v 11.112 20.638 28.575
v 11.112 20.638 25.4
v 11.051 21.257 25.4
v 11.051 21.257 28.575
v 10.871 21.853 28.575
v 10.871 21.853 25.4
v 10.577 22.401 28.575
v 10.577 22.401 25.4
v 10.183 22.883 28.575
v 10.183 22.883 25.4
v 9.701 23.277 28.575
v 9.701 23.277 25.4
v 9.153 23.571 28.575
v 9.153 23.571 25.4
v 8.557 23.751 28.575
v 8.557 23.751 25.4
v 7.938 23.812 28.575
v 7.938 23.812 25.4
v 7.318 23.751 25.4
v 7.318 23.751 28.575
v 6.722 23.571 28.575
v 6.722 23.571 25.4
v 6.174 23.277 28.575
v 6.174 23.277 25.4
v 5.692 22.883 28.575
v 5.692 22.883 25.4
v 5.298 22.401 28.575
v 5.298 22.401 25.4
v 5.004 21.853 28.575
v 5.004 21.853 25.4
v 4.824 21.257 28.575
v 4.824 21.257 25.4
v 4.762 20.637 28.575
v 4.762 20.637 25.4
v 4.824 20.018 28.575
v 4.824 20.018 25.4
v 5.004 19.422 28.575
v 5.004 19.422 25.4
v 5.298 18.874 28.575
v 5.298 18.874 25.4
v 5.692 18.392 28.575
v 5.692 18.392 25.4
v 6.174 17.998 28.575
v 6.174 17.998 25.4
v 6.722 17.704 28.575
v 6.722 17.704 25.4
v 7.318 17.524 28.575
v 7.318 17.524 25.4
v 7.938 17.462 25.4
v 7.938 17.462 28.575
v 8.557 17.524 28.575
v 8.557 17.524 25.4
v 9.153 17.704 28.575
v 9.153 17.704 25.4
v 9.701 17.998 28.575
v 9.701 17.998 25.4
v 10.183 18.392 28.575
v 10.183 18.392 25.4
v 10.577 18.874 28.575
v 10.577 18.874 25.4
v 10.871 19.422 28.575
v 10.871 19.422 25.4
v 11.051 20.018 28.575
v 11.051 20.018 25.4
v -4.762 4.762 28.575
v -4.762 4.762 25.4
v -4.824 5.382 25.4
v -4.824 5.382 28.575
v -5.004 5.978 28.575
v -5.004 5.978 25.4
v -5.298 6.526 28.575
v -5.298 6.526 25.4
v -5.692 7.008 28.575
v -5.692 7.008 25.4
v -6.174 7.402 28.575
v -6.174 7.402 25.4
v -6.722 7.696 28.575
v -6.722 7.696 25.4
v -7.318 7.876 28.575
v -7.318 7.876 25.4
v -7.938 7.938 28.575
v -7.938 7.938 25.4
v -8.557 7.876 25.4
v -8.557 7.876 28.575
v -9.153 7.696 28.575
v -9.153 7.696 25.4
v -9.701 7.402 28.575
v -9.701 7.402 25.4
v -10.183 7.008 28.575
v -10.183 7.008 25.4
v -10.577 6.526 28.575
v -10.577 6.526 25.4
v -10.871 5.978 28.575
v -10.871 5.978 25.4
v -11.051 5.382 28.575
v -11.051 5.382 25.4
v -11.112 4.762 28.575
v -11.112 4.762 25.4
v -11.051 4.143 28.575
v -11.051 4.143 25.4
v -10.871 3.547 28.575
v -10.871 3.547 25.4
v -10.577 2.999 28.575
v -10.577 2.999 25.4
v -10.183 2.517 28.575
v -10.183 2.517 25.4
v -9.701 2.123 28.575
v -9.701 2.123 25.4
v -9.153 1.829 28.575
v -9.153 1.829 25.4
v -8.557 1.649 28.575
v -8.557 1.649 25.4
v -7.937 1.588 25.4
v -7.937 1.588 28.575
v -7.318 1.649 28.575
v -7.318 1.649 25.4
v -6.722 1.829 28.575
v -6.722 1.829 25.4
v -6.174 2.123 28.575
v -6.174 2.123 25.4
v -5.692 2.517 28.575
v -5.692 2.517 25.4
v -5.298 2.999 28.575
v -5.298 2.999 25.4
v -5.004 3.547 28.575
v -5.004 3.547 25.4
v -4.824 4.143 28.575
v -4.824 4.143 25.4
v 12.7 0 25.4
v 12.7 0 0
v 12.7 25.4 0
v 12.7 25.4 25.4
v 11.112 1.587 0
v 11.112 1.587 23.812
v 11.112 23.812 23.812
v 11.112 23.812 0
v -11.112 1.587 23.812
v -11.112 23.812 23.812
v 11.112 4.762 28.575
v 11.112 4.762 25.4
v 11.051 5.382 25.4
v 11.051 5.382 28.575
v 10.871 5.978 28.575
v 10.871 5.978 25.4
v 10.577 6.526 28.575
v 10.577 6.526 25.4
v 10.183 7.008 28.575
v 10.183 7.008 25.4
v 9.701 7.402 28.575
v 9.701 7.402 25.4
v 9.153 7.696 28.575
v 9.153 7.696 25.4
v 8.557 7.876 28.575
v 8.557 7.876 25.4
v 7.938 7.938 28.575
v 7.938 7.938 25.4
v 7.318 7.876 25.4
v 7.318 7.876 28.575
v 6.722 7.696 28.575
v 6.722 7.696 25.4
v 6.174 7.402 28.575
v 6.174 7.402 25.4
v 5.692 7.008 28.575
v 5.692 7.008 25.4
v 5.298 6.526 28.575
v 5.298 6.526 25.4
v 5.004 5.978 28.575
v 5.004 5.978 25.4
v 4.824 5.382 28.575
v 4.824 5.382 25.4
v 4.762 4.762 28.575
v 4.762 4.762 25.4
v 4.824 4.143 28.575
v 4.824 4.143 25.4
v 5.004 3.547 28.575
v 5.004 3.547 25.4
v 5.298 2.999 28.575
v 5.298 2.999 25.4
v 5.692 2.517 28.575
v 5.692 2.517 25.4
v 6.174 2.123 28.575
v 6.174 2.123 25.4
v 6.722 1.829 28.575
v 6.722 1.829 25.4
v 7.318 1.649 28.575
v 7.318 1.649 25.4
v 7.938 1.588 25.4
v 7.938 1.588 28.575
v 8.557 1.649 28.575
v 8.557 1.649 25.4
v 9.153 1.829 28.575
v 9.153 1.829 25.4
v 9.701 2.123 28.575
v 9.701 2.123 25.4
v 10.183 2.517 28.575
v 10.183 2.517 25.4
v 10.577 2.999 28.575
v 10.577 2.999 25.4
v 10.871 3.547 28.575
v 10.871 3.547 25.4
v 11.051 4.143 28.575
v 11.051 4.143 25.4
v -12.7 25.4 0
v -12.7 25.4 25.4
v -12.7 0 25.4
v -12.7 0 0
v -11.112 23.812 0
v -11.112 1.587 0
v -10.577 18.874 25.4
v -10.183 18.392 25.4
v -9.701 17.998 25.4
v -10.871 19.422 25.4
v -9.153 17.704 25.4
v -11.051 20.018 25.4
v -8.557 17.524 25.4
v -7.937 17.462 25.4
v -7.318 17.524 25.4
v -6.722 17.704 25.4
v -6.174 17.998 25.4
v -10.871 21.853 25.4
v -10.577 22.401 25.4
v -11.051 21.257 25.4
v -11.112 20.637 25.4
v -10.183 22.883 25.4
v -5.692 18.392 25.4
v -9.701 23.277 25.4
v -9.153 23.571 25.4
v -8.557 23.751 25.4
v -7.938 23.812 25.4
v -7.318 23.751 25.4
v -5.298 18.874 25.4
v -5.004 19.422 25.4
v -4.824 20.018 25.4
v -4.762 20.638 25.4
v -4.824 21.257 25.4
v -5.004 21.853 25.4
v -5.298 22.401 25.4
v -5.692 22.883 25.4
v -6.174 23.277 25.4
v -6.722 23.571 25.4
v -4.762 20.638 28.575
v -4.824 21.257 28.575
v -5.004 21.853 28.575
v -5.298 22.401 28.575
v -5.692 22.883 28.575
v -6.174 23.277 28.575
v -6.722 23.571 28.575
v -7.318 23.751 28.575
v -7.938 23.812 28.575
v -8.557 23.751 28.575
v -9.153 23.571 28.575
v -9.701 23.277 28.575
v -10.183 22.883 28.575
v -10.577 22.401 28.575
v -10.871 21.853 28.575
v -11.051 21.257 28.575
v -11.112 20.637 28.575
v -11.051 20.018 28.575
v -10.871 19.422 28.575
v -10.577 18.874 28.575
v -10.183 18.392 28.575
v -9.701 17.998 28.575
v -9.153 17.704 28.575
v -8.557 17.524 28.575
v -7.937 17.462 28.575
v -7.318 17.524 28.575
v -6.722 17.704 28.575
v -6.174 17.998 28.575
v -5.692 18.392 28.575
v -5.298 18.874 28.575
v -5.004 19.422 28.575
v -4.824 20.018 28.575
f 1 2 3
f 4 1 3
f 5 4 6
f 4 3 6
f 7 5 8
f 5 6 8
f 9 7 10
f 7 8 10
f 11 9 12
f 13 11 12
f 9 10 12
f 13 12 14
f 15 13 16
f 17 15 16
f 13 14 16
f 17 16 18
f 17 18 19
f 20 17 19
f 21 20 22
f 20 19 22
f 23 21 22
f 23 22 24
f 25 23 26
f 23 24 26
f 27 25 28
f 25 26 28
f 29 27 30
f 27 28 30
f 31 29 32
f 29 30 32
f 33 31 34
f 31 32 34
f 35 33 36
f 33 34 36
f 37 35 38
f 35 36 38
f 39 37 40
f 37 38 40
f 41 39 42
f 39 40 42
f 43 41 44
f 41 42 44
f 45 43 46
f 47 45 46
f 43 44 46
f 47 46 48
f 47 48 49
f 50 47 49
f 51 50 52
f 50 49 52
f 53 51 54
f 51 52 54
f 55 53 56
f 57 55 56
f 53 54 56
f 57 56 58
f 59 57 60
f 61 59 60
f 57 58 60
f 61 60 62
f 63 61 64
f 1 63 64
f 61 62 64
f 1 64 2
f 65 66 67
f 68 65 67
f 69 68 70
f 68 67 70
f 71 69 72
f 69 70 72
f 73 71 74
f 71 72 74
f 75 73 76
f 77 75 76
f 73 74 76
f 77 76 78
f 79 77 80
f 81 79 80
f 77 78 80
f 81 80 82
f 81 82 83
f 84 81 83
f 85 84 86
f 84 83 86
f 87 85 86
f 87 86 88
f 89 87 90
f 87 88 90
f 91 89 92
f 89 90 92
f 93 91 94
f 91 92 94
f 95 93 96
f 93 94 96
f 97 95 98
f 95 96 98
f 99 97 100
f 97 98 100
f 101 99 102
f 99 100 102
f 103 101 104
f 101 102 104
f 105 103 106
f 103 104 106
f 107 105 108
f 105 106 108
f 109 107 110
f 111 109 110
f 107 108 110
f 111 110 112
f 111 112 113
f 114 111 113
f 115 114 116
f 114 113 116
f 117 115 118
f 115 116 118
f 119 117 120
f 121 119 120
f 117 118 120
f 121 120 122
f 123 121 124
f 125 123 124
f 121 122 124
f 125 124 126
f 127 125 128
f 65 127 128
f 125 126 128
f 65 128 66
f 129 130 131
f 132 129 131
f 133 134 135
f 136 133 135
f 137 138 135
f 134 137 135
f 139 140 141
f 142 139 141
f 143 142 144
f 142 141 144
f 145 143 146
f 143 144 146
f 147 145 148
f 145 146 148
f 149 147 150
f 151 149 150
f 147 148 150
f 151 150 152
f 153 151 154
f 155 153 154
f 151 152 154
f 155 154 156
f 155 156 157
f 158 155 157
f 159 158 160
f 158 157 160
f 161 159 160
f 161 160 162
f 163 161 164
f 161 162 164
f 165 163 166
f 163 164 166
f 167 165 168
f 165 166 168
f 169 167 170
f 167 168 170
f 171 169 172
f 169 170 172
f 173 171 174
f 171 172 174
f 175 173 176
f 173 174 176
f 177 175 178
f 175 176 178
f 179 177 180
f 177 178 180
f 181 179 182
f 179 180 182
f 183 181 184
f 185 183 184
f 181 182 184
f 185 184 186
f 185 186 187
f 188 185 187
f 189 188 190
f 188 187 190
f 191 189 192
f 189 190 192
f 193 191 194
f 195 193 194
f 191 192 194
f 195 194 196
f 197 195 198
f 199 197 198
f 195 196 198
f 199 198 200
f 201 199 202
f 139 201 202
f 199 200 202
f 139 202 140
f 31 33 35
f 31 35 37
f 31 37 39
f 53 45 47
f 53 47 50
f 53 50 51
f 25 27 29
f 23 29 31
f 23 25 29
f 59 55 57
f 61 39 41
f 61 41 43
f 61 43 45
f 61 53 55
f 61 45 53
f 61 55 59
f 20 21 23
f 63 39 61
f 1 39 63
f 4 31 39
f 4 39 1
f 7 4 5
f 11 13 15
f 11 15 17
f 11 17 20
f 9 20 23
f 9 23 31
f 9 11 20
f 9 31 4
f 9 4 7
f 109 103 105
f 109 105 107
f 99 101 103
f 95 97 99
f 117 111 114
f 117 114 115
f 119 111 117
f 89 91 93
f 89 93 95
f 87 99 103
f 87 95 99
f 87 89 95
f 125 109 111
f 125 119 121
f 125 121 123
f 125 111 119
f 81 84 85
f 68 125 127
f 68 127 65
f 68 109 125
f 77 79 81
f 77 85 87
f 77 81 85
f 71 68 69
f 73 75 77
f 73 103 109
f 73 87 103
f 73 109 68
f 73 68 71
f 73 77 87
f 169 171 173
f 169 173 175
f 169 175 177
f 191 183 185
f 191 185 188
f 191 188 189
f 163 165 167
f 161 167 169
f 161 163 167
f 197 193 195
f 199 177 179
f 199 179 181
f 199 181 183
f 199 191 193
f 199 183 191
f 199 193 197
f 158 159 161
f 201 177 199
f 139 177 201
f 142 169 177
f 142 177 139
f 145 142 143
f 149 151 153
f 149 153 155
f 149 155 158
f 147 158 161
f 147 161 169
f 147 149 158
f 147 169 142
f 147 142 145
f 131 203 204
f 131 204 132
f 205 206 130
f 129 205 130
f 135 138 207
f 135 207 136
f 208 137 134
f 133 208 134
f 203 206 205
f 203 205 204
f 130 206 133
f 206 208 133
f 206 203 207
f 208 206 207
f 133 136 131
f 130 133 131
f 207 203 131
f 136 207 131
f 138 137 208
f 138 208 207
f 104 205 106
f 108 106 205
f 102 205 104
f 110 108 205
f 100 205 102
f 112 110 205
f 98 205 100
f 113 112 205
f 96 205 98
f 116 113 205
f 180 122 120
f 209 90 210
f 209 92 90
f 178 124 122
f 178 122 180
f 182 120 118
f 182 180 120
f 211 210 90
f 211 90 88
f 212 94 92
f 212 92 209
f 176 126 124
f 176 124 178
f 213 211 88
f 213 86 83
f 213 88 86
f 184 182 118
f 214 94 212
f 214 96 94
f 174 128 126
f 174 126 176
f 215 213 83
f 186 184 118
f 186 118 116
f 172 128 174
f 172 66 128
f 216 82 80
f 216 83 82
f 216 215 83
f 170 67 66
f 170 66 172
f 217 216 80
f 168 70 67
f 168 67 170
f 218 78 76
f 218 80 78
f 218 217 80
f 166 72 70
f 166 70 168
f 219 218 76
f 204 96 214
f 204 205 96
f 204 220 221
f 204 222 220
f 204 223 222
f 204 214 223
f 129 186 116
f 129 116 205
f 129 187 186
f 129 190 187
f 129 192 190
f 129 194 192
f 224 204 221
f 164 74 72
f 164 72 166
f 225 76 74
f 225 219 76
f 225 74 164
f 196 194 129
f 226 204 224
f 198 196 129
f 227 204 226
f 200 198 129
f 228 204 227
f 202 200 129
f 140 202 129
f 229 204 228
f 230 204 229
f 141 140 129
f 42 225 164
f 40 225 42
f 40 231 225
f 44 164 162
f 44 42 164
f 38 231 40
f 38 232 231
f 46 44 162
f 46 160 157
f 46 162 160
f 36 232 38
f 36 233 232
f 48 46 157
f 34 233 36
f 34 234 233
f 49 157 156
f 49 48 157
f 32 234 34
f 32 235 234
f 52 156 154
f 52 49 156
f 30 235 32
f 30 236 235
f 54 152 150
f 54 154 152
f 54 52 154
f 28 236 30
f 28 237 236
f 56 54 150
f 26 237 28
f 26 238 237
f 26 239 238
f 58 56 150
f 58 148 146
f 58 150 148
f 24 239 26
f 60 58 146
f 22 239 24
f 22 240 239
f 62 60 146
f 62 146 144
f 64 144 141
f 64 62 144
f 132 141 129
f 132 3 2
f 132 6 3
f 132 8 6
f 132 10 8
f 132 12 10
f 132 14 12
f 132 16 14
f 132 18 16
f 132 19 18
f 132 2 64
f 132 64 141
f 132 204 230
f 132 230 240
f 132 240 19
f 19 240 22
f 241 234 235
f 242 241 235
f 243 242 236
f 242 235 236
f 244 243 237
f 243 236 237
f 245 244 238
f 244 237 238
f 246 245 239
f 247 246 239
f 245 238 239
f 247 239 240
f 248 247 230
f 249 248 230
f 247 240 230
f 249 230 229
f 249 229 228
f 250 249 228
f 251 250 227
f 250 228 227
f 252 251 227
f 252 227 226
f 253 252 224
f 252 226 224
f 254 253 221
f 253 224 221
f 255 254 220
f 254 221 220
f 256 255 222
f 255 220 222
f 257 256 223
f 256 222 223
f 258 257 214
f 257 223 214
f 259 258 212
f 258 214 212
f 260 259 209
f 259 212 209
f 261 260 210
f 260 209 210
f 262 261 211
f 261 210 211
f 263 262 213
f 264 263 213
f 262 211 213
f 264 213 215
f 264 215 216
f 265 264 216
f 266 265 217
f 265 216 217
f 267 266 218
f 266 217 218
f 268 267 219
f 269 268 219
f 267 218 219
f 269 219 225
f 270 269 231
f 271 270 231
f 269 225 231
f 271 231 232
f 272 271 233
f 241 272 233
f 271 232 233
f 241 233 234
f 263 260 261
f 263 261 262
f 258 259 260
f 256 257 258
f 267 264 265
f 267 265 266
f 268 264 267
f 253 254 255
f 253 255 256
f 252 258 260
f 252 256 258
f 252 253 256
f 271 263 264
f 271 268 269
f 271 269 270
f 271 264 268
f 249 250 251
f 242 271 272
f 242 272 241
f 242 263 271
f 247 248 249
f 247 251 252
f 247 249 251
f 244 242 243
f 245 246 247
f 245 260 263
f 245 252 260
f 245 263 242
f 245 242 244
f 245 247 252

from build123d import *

# Parameters (mm, degrees)
F0_W     = 25.4
F0_H     = 25.4
F0_W_2   = 22.225
F0_H_2   = 22.225
F1_DEPTH = 25.4
F2_DEPTH = 23.8125
F3_R     = 3.175
F4_DEPTH = 3.175


with BuildPart() as f1:
    # F0 (on Top) → F1 (new body)
    with BuildSketch(Plane.XY):
        with Locations((0, 12.7)):
            Rectangle(F0_W, F0_H)
        with Locations((0, 12.7)):
            Rectangle(F0_W_2, F0_H_2, mode=Mode.SUBTRACT)
        with Locations((0, 12.7)):
            Rectangle(F0_W_2, F0_H_2)
    extrude(amount=F1_DEPTH)

    # F0 (on Top) → F2 (cut)
    with BuildSketch(Plane.XY):
        with Locations((0, 12.7)):
            Rectangle(F0_W_2, F0_H_2)
    extrude(amount=F2_DEPTH, mode=Mode.SUBTRACT)

    # F3 (on face) → F4 (join)
    with BuildSketch(Plane.XY.offset(25.4)):
        with Locations((7.9375, 4.7625)):
            Circle(F3_R)
        with Locations((7.9375, 20.6375)):
            Circle(F3_R)
        with Locations((-7.9375, 20.6375)):
            Circle(F3_R)
        with Locations((-7.9375, 4.7625)):
            Circle(F3_R)
    extrude(amount=F4_DEPTH)


solid = f1.part
